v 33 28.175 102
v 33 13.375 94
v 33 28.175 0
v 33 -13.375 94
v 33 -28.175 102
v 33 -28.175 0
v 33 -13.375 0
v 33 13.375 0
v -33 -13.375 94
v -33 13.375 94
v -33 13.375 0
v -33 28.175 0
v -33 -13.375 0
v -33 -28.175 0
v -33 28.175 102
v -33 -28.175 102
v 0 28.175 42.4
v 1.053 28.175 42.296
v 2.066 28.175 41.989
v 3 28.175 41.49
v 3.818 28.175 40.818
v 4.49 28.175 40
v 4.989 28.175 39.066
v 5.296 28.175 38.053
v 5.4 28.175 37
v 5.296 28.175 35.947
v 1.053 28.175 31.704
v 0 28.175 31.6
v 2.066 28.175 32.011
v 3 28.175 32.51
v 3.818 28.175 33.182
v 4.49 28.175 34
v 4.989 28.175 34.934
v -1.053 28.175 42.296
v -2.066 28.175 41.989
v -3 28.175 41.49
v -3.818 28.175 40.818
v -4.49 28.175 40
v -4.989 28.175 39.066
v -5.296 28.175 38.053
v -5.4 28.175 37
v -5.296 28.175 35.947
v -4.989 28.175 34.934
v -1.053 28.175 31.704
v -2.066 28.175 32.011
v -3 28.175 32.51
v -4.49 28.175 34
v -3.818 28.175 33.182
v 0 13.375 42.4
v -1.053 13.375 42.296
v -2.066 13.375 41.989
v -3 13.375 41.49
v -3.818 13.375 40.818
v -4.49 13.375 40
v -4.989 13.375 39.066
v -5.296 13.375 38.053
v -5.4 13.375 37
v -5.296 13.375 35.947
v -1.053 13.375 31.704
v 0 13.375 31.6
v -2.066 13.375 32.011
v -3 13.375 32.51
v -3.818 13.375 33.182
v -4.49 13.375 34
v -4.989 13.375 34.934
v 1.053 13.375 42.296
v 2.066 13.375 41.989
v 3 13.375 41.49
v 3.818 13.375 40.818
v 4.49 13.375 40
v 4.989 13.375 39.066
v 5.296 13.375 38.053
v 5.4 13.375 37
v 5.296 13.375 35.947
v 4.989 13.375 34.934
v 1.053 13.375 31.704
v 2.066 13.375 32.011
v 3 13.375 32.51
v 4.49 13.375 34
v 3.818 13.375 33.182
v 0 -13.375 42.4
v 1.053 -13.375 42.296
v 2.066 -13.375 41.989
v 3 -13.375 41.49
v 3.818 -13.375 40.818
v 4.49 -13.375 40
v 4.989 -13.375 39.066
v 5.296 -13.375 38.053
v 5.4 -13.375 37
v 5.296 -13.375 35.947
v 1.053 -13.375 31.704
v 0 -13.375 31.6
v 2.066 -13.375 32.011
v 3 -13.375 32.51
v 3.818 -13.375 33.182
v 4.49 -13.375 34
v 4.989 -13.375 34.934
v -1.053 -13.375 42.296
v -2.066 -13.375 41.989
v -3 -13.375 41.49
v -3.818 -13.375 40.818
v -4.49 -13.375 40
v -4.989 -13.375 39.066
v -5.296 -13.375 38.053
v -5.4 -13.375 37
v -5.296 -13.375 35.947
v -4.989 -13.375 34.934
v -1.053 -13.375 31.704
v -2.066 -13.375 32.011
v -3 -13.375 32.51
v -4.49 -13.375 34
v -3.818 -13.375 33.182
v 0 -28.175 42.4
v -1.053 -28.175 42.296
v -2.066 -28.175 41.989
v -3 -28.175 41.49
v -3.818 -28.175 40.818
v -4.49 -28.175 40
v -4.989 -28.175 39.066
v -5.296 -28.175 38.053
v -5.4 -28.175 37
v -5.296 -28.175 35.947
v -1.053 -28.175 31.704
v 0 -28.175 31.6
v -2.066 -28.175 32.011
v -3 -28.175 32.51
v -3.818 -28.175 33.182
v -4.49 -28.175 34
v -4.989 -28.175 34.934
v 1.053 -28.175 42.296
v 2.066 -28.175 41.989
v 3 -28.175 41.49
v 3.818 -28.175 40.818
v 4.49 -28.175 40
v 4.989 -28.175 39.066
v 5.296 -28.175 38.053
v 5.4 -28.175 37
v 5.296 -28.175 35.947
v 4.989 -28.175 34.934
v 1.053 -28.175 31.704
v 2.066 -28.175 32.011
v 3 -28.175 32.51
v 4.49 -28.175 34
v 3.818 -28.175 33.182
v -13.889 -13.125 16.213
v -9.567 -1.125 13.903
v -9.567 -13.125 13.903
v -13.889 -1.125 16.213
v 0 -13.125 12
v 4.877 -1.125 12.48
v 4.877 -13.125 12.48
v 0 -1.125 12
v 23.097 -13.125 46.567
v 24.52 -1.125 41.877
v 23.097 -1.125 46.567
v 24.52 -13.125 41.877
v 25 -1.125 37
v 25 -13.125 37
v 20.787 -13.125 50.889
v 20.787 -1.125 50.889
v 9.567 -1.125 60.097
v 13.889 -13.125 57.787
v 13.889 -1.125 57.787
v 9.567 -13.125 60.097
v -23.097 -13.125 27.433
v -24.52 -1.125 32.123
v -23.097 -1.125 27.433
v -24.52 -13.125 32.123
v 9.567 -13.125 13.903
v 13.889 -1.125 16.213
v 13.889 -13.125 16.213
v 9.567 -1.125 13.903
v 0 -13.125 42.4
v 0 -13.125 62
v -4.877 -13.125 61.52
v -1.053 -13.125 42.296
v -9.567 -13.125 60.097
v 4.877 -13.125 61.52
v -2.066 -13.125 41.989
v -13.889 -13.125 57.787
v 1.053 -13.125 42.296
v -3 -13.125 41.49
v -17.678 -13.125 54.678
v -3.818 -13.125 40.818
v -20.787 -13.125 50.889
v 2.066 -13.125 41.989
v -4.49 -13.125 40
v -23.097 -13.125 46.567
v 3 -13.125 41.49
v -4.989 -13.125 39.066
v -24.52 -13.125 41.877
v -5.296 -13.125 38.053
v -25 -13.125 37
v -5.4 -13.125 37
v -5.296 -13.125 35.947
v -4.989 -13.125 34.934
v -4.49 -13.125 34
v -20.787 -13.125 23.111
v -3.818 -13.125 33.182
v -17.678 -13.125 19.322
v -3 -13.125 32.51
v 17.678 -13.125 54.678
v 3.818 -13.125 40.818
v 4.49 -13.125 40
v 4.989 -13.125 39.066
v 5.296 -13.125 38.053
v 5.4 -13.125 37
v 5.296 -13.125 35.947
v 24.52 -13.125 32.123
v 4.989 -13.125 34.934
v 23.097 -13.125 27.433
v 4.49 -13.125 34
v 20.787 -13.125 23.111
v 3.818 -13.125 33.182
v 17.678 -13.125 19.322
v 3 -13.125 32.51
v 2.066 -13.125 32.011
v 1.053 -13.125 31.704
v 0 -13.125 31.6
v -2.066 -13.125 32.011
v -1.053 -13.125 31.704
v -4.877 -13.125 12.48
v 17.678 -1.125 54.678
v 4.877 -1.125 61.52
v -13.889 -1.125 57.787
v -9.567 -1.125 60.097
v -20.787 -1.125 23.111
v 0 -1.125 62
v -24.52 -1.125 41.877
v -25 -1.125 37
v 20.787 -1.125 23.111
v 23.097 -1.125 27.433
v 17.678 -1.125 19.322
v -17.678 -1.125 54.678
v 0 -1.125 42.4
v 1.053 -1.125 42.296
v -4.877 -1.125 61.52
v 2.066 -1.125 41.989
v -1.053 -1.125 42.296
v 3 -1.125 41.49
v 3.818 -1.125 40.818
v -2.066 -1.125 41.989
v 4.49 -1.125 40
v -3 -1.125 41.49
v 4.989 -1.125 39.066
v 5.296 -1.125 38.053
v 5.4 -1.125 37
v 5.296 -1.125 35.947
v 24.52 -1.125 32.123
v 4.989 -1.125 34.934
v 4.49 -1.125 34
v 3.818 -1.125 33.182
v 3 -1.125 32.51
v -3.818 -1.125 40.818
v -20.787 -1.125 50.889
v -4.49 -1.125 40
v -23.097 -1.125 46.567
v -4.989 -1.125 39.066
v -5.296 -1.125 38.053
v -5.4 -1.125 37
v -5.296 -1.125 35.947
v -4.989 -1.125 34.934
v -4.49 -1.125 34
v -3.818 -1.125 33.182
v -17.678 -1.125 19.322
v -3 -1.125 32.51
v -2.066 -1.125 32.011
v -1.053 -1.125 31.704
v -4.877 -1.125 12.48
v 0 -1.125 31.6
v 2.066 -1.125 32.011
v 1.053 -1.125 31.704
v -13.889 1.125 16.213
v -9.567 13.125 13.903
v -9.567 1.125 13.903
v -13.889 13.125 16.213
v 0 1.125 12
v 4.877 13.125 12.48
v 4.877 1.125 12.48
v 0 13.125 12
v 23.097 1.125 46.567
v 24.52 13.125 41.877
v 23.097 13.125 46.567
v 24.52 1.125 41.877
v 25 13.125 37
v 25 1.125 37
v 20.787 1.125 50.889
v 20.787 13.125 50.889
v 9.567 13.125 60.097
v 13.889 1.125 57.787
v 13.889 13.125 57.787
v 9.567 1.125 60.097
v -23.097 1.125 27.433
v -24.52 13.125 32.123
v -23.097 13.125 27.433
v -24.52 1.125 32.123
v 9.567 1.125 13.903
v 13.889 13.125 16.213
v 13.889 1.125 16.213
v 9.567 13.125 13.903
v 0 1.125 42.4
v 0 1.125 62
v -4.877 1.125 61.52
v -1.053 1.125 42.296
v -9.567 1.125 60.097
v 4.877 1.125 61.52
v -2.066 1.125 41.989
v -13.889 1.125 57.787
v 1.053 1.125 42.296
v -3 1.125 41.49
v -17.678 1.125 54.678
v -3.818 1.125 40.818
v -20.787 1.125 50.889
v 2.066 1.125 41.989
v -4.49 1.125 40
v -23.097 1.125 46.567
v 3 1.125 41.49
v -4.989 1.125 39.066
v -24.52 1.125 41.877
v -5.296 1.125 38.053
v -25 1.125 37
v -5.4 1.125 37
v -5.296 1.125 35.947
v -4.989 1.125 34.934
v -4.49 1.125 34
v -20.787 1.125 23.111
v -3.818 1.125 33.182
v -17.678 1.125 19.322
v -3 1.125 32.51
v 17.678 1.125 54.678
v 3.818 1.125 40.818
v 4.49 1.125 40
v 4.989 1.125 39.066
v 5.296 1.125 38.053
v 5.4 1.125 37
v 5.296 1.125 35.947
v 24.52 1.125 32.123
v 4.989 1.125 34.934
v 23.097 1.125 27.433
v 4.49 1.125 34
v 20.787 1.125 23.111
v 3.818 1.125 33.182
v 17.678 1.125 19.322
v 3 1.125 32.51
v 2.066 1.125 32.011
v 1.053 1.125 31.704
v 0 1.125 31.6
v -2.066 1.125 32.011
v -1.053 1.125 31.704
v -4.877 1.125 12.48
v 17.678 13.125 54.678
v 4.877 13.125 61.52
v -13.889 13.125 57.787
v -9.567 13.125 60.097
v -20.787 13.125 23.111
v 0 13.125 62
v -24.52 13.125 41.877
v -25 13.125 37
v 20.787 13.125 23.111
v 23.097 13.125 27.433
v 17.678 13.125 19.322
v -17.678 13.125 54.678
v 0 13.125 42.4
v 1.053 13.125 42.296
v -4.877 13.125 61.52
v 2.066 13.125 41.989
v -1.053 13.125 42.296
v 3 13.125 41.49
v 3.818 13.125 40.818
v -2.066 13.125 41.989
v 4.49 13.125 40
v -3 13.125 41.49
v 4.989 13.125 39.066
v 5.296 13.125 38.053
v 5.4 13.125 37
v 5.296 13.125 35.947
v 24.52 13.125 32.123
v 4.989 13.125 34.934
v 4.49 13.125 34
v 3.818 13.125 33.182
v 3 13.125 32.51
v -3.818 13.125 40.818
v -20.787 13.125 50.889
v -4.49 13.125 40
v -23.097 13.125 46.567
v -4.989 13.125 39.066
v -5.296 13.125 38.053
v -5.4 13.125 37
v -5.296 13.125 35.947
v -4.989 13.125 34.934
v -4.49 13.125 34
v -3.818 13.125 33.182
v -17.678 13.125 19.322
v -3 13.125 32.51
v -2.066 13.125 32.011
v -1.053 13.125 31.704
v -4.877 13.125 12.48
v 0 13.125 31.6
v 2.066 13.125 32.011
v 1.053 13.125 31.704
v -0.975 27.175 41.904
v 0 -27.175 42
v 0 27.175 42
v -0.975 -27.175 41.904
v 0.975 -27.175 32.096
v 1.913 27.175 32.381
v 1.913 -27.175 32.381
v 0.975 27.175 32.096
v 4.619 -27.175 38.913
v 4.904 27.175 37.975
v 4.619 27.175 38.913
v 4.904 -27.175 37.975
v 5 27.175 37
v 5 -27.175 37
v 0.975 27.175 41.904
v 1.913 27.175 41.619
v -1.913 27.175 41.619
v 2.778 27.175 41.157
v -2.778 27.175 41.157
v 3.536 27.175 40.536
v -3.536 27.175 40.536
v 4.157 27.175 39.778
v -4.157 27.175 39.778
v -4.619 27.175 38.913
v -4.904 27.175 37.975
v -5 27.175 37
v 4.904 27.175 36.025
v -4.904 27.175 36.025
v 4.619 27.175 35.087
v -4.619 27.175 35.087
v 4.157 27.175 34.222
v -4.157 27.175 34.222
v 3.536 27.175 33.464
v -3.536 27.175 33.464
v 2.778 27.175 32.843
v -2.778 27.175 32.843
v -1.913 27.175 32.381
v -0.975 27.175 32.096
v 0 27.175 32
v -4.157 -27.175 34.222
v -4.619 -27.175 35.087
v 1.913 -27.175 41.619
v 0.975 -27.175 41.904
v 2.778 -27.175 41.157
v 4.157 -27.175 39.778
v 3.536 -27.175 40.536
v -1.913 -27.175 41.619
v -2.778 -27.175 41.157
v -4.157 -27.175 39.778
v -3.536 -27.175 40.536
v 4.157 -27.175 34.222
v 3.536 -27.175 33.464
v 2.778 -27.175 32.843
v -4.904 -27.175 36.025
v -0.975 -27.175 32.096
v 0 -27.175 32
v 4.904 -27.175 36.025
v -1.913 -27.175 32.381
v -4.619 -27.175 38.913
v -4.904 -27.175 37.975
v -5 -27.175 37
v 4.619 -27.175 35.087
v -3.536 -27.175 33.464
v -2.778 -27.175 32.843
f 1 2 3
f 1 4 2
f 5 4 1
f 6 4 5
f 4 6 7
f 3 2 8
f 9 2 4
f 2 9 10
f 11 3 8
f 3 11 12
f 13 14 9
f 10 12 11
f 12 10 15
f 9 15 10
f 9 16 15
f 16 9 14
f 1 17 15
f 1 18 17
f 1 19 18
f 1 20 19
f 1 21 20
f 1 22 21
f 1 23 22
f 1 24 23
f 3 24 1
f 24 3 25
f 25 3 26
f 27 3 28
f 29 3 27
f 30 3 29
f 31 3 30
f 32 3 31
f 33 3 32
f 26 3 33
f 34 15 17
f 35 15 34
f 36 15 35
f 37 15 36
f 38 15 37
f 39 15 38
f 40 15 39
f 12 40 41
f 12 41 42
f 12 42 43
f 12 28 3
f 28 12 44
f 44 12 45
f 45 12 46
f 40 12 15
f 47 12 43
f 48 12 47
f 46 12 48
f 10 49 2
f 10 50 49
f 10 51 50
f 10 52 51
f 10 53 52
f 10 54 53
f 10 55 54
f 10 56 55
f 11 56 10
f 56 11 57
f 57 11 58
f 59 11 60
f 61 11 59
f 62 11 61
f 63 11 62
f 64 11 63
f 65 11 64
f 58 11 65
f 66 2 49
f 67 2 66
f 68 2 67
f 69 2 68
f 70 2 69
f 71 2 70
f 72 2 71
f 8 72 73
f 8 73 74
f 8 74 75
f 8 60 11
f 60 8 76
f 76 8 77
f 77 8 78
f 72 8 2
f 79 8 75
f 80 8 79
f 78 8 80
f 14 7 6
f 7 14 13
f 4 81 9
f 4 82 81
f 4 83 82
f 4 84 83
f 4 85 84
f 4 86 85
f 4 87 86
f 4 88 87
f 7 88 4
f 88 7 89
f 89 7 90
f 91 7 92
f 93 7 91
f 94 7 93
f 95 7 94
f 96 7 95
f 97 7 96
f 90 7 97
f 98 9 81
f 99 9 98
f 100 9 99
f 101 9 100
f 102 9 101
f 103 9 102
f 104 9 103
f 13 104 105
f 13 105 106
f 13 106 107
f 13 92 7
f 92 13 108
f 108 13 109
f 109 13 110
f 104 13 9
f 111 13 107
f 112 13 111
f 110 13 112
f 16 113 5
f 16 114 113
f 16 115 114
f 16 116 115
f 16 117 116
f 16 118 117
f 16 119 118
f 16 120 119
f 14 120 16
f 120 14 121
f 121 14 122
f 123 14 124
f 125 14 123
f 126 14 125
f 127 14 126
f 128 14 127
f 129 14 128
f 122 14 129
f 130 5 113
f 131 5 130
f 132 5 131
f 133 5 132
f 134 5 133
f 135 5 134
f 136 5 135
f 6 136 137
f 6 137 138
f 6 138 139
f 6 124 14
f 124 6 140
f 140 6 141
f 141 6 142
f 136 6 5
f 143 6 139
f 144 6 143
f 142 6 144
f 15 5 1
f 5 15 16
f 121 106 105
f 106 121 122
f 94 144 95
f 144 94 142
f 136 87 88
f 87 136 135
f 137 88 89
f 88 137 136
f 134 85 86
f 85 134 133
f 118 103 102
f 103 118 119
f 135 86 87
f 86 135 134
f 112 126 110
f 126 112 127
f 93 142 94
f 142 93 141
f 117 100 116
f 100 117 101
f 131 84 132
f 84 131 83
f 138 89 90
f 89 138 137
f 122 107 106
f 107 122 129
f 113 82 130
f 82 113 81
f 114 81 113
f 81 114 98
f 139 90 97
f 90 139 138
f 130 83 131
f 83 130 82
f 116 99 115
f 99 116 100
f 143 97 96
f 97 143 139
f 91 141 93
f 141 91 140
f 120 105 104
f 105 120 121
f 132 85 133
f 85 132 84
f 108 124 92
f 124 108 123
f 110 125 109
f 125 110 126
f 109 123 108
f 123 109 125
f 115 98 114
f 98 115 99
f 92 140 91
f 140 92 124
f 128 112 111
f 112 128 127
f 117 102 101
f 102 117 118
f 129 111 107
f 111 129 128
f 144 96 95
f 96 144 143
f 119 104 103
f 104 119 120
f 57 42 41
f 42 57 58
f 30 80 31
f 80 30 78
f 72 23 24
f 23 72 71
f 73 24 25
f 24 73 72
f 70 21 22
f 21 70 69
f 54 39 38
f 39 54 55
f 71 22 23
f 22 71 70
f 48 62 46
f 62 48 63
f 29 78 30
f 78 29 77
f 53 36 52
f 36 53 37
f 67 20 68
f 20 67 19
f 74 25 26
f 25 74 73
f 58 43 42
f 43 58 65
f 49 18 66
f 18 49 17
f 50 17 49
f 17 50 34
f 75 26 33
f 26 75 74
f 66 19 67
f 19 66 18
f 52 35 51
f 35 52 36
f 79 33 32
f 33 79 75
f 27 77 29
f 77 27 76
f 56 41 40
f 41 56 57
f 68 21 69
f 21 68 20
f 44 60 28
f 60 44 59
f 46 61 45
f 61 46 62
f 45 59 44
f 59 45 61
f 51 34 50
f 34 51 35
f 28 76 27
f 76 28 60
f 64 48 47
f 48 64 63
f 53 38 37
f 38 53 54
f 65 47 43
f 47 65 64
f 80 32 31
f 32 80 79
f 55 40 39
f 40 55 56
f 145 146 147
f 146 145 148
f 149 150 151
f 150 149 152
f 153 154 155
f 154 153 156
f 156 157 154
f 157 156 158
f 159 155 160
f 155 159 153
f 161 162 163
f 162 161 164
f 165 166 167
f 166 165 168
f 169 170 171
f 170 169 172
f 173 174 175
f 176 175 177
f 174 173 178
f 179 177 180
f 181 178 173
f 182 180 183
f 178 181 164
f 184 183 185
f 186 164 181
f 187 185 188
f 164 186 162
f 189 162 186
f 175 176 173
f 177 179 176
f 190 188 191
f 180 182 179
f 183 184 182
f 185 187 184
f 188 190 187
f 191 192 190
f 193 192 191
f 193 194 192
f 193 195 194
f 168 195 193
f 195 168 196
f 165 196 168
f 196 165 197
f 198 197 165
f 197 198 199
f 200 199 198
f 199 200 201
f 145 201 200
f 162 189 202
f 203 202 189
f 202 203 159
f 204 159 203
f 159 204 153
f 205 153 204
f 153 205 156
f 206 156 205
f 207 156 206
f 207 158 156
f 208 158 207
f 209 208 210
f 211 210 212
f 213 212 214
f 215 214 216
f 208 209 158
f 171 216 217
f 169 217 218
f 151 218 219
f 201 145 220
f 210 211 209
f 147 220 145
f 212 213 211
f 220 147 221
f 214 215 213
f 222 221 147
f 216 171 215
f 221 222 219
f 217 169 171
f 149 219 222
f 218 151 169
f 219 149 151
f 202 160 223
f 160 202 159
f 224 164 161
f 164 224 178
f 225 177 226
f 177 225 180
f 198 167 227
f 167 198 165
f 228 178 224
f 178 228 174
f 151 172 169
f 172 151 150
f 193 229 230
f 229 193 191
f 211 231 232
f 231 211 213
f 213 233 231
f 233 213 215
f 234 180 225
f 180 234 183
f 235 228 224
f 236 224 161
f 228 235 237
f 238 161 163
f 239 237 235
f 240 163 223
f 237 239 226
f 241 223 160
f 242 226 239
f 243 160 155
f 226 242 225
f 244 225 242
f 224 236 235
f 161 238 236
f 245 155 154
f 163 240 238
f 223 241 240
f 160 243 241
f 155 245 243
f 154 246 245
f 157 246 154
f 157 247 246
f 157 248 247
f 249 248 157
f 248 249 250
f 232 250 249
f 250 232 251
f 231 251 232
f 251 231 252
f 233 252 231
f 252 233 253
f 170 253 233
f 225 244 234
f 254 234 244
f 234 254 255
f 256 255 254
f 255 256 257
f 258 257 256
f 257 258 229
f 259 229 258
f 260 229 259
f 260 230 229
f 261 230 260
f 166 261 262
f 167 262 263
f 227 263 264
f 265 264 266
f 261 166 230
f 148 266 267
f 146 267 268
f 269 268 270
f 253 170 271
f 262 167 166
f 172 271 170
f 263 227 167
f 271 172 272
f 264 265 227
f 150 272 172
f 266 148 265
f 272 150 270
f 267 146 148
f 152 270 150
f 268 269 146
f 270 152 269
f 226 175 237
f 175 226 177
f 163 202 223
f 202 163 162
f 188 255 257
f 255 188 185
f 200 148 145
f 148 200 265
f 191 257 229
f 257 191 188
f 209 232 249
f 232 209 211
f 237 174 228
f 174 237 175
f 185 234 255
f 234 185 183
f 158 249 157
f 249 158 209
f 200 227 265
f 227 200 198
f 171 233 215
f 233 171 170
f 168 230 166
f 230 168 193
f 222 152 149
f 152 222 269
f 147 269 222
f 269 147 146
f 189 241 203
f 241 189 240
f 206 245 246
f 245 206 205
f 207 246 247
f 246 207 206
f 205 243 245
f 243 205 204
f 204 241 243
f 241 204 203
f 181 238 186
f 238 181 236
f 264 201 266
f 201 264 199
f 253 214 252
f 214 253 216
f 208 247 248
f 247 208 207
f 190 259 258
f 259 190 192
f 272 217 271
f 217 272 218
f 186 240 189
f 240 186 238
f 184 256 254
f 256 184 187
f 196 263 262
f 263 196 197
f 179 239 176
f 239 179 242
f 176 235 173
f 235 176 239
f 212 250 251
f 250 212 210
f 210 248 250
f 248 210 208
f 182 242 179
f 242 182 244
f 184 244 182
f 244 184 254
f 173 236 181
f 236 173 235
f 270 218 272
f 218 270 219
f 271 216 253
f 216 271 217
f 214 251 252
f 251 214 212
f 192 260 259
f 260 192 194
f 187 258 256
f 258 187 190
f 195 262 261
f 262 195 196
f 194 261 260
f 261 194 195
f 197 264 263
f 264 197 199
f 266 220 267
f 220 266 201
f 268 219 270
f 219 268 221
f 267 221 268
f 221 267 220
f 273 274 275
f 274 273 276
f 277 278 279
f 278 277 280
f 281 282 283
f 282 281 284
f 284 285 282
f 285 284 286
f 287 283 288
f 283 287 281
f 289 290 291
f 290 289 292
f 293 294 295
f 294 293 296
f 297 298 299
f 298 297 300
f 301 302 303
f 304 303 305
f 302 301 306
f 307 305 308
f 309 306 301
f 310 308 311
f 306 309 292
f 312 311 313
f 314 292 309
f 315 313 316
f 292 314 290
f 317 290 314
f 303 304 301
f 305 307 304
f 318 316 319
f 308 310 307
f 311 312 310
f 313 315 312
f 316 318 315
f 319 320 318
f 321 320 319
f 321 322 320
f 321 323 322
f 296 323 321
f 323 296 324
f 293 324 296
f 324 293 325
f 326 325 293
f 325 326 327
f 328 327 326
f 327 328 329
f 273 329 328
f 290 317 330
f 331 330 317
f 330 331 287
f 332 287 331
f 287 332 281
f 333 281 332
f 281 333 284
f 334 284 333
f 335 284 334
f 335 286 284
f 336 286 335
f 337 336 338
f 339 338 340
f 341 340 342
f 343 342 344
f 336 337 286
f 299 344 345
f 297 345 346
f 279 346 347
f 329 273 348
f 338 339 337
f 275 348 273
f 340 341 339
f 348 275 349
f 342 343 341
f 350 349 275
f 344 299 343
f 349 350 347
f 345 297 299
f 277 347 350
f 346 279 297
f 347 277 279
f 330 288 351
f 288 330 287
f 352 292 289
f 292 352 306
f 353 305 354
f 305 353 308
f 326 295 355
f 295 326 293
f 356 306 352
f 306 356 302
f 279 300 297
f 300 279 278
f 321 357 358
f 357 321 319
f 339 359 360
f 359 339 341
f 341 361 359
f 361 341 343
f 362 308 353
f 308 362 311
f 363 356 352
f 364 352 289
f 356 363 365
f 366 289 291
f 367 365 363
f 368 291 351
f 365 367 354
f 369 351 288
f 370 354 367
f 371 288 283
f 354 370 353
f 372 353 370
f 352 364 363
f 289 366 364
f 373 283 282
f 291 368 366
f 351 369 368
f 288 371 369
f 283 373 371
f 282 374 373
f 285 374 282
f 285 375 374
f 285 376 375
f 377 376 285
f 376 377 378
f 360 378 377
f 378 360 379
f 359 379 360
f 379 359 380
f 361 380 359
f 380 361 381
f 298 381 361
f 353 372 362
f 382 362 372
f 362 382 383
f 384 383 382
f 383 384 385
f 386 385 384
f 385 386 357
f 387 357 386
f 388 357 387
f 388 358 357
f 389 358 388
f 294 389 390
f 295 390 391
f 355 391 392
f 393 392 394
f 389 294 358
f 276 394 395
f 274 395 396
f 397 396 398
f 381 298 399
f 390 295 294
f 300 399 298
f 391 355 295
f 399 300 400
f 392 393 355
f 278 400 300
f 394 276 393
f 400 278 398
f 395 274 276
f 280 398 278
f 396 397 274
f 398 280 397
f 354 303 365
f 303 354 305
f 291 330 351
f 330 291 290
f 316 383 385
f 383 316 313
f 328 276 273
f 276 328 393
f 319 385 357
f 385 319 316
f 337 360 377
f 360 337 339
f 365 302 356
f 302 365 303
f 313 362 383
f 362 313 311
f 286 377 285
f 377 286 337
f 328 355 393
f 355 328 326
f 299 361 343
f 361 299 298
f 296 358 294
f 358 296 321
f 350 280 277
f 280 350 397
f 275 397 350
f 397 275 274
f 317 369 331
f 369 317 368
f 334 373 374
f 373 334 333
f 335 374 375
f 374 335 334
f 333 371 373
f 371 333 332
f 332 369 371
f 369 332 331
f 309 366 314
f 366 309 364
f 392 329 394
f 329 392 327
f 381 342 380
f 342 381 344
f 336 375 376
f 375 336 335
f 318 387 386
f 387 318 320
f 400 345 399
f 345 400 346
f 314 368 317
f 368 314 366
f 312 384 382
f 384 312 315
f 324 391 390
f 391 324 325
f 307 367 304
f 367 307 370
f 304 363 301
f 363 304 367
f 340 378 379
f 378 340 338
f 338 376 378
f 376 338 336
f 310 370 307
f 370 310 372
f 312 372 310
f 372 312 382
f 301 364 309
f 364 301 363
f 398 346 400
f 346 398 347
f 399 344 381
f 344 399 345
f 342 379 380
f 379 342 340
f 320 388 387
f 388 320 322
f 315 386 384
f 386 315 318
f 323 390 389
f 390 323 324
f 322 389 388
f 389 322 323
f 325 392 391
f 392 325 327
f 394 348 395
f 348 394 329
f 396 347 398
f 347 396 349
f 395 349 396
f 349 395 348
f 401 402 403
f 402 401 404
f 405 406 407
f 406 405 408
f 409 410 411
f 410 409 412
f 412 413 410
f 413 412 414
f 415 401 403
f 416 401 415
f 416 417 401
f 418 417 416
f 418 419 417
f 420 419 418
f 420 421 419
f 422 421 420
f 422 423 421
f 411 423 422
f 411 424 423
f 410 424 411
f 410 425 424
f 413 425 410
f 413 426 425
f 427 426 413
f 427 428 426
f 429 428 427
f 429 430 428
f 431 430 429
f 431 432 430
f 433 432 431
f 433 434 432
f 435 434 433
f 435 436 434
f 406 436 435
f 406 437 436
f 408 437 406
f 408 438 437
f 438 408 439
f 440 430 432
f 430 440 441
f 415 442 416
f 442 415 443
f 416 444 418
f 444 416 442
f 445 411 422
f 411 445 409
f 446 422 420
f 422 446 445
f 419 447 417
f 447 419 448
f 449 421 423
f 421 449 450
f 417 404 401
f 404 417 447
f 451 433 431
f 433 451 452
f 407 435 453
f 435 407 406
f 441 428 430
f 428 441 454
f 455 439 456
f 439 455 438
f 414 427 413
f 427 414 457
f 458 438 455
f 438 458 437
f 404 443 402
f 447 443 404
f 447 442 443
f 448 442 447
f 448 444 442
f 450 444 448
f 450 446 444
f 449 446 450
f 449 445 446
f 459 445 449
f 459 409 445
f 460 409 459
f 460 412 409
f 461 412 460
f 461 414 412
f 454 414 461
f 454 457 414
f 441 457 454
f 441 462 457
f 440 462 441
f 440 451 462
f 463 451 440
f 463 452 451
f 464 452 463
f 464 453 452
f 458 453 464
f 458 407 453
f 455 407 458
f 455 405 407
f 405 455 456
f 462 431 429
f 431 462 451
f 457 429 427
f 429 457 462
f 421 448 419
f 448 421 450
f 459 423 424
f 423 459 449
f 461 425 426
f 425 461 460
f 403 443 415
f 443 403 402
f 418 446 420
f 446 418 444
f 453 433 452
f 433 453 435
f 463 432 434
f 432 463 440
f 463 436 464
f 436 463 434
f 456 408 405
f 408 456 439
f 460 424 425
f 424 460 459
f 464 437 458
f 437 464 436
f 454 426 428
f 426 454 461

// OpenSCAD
$fn = 32;

// ------------------------------------------------------------------------
// Trolley wheel set: wheels d50, fork 94 mm tall
// Every part is its own module, assembly() places every instance.
// ------------------------------------------------------------------------

// --- part 1 ---
module trolley_fork() {
  difference() {
    union() {
      translate([-33, 13.375, 0]) cube([66, 14.8, 94]);
      translate([-33, -28.175, 0]) cube([66, 14.8, 94]);
      translate([-33, -28.175, 94]) cube([66, 56.35, 8]);
    }
    translate([0, -20.775, 37]) rotate([90, 0, 0]) cylinder(h = 16.8, d = 10.8, center = true);
    translate([0, 20.775, 37]) rotate([90, 0, 0]) cylinder(h = 16.8, d = 10.8, center = true);
  }
}

// --- part 2 ---
module trolley_wheel() {
  difference() {
      translate([0, 0, 0]) cylinder(h = 12, d = 50);
      translate([0, 0, -1]) cylinder(h = 14, d = 10.8);
    }
}

// --- part 3 ---
module trolley_axle() {
  translate([0, 0, -27.175]) cylinder(h = 54.35, d = 10);
}

// --- assembly ---
module assembly() {
  color([0.80, 0.24, 0.20]) translate([0, 0, 0]) rotate([0, 0, 0]) trolley_fork();
  color([0.20, 0.45, 0.75]) translate([0, -1.125, 37]) rotate([90, 0, 0]) trolley_wheel();
  color([0.25, 0.62, 0.32]) translate([0, 13.125, 37]) rotate([90, 0, 0]) trolley_wheel();
  color([0.92, 0.70, 0.18]) translate([0, 0, 37]) rotate([90, 0, 0]) trolley_axle();
}

assembly();
